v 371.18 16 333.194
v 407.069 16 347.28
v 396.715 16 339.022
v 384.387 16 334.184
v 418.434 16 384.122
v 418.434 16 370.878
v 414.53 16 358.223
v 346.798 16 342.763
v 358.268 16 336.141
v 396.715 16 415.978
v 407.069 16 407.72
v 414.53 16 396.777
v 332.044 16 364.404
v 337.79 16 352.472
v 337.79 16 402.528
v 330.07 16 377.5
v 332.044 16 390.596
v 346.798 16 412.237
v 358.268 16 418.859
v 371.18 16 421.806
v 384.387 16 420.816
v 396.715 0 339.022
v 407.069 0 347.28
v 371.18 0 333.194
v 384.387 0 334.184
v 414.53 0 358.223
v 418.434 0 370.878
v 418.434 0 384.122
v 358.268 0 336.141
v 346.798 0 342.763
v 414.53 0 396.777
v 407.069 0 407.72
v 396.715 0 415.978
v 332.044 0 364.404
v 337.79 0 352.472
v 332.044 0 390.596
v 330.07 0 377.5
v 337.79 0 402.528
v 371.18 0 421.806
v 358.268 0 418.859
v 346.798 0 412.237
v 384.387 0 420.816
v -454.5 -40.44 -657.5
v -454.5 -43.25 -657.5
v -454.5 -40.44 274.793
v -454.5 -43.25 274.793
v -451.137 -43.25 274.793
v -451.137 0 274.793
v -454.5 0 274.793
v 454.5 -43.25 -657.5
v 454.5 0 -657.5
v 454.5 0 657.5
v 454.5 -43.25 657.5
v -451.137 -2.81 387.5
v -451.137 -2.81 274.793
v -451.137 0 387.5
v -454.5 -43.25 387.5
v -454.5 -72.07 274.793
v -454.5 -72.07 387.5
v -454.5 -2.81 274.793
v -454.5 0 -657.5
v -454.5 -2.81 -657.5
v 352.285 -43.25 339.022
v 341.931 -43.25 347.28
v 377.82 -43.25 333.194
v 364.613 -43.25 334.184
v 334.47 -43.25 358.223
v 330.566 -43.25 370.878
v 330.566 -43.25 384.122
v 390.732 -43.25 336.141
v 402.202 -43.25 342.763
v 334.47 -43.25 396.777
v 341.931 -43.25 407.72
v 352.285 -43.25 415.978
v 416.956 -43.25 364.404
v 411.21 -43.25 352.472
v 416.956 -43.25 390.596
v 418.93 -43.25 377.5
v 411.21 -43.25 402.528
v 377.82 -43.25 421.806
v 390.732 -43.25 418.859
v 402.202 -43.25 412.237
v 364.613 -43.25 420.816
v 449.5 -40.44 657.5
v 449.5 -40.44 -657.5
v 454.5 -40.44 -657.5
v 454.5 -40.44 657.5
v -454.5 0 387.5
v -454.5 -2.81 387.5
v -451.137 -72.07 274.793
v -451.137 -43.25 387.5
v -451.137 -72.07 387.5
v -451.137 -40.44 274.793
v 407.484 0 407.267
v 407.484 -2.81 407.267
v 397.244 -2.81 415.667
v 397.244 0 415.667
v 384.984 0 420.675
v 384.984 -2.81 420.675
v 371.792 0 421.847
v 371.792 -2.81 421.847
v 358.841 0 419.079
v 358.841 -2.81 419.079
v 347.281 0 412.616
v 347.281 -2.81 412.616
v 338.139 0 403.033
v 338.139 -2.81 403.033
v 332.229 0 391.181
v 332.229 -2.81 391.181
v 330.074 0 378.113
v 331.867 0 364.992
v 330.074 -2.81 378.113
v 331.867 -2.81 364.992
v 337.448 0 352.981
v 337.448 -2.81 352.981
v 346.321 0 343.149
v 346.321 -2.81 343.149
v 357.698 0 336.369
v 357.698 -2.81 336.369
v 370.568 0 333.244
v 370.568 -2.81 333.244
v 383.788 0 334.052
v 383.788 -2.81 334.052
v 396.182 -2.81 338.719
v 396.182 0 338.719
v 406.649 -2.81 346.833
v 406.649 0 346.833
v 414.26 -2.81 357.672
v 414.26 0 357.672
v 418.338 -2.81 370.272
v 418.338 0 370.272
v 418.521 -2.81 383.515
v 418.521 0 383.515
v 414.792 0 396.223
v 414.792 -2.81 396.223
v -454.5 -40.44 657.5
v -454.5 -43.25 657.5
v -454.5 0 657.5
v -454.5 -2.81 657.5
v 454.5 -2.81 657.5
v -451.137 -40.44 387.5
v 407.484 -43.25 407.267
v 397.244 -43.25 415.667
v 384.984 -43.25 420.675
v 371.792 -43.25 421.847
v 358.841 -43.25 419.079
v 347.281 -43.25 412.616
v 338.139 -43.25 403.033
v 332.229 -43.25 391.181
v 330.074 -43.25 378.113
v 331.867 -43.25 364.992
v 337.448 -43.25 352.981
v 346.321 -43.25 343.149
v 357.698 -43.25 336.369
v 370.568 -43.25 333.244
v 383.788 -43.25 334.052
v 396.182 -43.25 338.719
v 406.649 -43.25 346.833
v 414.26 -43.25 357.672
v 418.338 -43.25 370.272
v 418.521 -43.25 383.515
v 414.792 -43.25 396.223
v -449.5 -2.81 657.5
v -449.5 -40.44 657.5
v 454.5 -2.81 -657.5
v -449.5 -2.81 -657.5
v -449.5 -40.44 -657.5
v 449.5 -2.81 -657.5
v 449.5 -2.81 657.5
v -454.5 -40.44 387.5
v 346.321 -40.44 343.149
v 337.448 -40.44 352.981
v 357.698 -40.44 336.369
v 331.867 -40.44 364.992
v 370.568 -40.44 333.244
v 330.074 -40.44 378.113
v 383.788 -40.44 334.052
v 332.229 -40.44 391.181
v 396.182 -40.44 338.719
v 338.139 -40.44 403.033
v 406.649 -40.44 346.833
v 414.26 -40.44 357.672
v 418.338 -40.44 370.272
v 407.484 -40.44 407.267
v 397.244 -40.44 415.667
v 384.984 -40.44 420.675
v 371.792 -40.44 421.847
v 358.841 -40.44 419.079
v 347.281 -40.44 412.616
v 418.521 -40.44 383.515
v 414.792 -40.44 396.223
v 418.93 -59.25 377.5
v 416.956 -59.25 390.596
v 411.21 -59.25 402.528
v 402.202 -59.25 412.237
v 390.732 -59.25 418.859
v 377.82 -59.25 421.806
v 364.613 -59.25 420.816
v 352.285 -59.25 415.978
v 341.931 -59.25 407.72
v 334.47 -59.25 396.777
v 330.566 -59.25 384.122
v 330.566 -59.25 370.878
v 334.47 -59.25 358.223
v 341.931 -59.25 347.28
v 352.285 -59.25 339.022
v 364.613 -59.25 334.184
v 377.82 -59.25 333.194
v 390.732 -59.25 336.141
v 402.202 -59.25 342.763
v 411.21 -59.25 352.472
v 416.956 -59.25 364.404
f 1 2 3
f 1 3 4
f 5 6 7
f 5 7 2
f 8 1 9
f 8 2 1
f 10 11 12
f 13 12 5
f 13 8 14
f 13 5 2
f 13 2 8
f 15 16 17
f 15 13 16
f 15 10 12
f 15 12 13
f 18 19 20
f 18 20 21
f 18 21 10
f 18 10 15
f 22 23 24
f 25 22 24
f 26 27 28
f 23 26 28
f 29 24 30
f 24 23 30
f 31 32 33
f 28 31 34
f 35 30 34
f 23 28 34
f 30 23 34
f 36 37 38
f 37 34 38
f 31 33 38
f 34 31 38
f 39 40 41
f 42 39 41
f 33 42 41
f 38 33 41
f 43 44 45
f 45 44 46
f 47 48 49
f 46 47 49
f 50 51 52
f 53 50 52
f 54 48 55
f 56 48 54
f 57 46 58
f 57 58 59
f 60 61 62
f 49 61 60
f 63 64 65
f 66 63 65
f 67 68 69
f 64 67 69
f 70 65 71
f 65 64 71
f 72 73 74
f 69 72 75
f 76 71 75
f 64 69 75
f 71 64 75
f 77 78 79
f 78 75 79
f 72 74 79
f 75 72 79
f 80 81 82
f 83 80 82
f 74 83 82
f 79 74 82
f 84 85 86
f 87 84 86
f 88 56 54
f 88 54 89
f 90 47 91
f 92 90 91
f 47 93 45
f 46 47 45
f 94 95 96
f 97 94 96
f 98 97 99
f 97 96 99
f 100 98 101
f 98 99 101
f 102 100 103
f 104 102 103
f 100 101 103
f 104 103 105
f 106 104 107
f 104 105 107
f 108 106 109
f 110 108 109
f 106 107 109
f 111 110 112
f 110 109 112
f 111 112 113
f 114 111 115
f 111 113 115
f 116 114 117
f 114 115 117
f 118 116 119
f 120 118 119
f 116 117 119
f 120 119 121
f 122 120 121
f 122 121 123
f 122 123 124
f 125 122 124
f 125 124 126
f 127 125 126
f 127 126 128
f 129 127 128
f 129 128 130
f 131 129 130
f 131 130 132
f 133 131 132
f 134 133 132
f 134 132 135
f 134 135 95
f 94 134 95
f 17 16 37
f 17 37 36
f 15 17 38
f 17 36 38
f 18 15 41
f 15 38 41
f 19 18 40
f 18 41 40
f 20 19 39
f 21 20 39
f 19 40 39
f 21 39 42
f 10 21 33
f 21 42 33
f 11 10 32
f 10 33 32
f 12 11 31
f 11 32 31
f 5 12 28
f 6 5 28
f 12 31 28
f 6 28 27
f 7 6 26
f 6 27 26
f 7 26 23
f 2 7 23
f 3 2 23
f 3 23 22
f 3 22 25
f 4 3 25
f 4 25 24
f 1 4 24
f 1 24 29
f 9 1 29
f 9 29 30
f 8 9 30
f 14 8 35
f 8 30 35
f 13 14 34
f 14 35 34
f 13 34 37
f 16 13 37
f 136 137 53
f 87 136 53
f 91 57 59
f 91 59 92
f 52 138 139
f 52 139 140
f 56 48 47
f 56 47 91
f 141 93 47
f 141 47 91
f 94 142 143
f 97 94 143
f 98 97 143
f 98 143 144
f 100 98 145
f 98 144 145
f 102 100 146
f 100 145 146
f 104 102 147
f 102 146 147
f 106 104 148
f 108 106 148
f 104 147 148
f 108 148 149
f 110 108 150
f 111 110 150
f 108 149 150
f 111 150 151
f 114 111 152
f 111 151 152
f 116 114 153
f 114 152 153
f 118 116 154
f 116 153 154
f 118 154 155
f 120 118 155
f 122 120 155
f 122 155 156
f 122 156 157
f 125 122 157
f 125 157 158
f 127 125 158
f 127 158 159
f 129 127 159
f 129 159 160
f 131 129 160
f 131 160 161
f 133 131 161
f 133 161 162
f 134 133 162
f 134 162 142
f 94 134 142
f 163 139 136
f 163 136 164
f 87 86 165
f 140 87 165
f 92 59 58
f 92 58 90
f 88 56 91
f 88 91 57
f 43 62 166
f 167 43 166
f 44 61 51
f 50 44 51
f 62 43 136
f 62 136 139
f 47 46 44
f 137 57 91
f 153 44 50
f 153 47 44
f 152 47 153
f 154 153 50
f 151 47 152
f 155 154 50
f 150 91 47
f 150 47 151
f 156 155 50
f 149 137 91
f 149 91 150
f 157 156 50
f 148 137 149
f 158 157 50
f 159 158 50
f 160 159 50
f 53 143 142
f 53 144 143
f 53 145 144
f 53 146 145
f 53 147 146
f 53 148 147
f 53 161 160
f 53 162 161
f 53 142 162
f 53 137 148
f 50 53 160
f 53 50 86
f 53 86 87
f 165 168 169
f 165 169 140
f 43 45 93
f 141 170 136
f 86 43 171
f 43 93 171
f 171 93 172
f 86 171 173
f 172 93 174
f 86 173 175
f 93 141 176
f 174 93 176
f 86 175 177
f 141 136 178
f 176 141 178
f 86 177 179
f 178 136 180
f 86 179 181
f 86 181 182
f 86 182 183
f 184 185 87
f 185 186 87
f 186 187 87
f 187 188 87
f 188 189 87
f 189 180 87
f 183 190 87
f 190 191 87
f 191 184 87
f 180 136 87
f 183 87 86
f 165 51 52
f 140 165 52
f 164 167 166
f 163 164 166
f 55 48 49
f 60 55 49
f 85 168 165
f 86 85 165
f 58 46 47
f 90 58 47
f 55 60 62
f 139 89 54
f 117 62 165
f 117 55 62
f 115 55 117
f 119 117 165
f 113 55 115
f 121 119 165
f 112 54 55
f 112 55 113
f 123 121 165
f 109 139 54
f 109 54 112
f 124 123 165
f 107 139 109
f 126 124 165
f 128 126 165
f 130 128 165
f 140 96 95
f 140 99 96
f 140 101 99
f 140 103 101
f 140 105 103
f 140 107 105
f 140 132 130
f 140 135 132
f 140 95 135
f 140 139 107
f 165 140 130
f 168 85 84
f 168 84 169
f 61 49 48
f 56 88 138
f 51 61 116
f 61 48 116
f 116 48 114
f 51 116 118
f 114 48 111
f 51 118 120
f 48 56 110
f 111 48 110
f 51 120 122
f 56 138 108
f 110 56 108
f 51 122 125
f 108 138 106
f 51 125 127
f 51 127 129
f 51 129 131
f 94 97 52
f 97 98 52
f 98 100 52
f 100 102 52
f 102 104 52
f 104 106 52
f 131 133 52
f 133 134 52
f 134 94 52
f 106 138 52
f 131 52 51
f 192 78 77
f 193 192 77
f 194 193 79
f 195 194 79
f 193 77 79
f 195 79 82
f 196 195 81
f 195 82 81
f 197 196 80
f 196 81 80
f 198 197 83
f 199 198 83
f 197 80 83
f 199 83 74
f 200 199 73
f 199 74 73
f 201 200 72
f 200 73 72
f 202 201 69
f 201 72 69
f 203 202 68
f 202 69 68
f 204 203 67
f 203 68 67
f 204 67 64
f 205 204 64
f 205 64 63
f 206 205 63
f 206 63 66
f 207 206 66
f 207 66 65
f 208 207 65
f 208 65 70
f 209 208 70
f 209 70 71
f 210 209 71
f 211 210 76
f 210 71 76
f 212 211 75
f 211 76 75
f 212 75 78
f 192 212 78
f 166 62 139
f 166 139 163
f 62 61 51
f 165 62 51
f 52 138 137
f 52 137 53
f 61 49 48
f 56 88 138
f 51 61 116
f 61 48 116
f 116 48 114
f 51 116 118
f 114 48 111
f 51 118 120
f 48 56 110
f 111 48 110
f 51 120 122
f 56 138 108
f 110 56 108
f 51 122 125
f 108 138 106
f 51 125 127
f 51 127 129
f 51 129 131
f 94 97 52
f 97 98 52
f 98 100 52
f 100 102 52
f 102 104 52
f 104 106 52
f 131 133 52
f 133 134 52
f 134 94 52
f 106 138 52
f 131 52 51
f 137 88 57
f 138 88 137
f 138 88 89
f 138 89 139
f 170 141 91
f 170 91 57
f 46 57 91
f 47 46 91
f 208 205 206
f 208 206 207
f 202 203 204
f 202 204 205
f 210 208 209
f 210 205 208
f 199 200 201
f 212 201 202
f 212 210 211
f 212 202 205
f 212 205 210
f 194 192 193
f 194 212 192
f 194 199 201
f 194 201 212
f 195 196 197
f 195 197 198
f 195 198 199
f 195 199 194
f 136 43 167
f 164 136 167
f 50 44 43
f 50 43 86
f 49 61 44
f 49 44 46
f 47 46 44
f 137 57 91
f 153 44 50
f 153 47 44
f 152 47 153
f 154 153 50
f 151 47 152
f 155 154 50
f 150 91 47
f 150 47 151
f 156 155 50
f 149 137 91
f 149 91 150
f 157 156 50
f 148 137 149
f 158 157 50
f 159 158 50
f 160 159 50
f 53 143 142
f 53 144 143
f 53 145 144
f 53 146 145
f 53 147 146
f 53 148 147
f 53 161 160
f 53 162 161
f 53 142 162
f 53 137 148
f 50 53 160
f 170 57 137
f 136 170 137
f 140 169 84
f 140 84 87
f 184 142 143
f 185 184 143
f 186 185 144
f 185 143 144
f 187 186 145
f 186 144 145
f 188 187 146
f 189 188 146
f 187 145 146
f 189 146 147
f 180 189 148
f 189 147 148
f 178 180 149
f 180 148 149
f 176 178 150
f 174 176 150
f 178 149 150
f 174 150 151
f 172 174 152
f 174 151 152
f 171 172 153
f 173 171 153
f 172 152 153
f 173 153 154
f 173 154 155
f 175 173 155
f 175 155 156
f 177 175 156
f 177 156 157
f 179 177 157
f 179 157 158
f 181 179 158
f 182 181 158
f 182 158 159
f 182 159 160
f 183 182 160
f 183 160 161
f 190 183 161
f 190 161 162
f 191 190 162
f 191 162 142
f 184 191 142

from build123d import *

# Parameters (mm, degrees)
F0_W      = 909
F0_H      = 1315
F1_DEPTH  = 43.25
F2_DEPTH  = 2.81
F3_DEPTH  = 2.81
F5_DEPTH  = 43.251
F6_W      = 3.3626373626
F6_H      = 112.7066911446
F7_DEPTH  = 43.251
F8_R      = 44.43
F9_DEPTH  = 16
F10_R     = 44.43
F11_DEPTH = 16
F12_W     = 3.3626373626
F12_H     = 112.7066911446
F13_DEPTH = 28.82
F14_W     = 5
F14_H     = 37.63
F15_DEPTH = 1315


with BuildPart() as f1:
    # F0 (on Front) → F1 (new body)
    with BuildSketch(Plane.XZ):
        Rectangle(F0_W, F0_H)
    extrude(amount=F1_DEPTH)


with BuildPart() as f2:
    # F2 (new): a face of the model
    f2_faces = [f1.part.faces().sort_by_distance(p)[0] for p in [
        (0, -43.25, 0),
    ]]
    extrude(f2_faces, amount=-F2_DEPTH)


with BuildPart() as f3:
    # F3 (new): a face of the model
    f3_faces = [f1.part.faces().sort_by_distance(p)[0] for p in [
        (0, 0, 0),
    ]]
    extrude(f3_faces, amount=-F3_DEPTH)


with BuildPart() as f5_tool:
    # F4 (on face) → F5 (new body, through all)
    with BuildSketch(Plane.XZ.offset(43.25)):
        with BuildLine():
            ThreePointArc((418.93, 377.5), (415.9698036577, 393.4461683357), (407.4836671352, 407.2674755784))
            Line((407.4836671352, 407.2674755784), (407.4836671352, 377.5))
            Line((407.4836671352, 377.5), (418.93, 377.5))
        make_face()
        with BuildLine():
            Line((407.4836671352, 377.5), (407.4836671352, 407.2674755784))
            ThreePointArc((407.4836671352, 407.2674755784), (333.0301963423, 361.5538316643), (418.93, 377.5))
            Line((418.93, 377.5), (407.4836671352, 377.5))
        make_face()
    extrude(amount=-F5_DEPTH)


with BuildPart() as f1_1:
    add(f1.part)

    # F5: cut by f5_tool
    add(f5_tool.part, mode=Mode.SUBTRACT)


with BuildPart() as f2_1:
    add(f2.part)

    # F5: cut by f5_tool
    add(f5_tool.part, mode=Mode.SUBTRACT)


with BuildPart() as f3_1:
    add(f3.part)

    # F5: cut by f5_tool
    add(f5_tool.part, mode=Mode.SUBTRACT)


with BuildPart() as f7_tool:
    # F6 (on face) → F7 (new body, through all)
    with BuildSketch(Plane(origin=(0, 0, 0), x_dir=(-1, 0, 0), z_dir=(0, 1, 0))):
        with Locations((452.8186813187, 331.1466544277)):
            Rectangle(F6_W, F6_H)
    extrude(amount=-F7_DEPTH)


with BuildPart() as f1_2:
    add(f1_1.part)

    # F7: cut by f7_tool
    add(f7_tool.part, mode=Mode.SUBTRACT)


with BuildPart() as f2_2:
    add(f2_1.part)

    # F7: cut by f7_tool
    add(f7_tool.part, mode=Mode.SUBTRACT)


with BuildPart() as f3_2:
    add(f3_1.part)

    # F7: cut by f7_tool
    add(f7_tool.part, mode=Mode.SUBTRACT)


with BuildPart() as f9:
    # F8 (on face) → F9 (new body)
    with BuildSketch(Plane.XZ.offset(43.25)):
        with Locations((374.5, 377.5)):
            Circle(F8_R)
    extrude(amount=F9_DEPTH)


with BuildPart() as f11:
    # F10 (on face) → F11 (new body)
    with BuildSketch(Plane(origin=(0, 0, 0), x_dir=(-1, 0, 0), z_dir=(0, 1, 0))):
        with Locations((-374.5, 377.5)):
            Circle(F10_R)
    extrude(amount=F11_DEPTH)


with BuildPart() as f13:
    # F12 (on face) → F13 (new body)
    with BuildSketch(Plane.XZ.offset(43.25)):
        with Locations((-452.8186813187, 331.1466544277)):
            Rectangle(F12_W, F12_H)
    extrude(amount=F13_DEPTH)


with BuildPart() as f15:
    # F14 (on face) → F15 (new body)
    with BuildSketch(Plane.XY.offset(657.5)):
        with Locations((-452, -21.625)):
            Rectangle(F14_W, F14_H)
    extrude(amount=-F15_DEPTH)


with BuildPart() as f15b:
    # F14 (on face) → F15, piece 2 (new body)
    with BuildSketch(Plane.XY.offset(657.5)):
        with Locations((452, -21.625)):
            Rectangle(F14_W, F14_H)
    extrude(amount=-F15_DEPTH)


solid = Compound([f1_2.part, f2_2.part, f3_2.part, f9.part, f11.part, f13.part, f15.part, f15b.part])
